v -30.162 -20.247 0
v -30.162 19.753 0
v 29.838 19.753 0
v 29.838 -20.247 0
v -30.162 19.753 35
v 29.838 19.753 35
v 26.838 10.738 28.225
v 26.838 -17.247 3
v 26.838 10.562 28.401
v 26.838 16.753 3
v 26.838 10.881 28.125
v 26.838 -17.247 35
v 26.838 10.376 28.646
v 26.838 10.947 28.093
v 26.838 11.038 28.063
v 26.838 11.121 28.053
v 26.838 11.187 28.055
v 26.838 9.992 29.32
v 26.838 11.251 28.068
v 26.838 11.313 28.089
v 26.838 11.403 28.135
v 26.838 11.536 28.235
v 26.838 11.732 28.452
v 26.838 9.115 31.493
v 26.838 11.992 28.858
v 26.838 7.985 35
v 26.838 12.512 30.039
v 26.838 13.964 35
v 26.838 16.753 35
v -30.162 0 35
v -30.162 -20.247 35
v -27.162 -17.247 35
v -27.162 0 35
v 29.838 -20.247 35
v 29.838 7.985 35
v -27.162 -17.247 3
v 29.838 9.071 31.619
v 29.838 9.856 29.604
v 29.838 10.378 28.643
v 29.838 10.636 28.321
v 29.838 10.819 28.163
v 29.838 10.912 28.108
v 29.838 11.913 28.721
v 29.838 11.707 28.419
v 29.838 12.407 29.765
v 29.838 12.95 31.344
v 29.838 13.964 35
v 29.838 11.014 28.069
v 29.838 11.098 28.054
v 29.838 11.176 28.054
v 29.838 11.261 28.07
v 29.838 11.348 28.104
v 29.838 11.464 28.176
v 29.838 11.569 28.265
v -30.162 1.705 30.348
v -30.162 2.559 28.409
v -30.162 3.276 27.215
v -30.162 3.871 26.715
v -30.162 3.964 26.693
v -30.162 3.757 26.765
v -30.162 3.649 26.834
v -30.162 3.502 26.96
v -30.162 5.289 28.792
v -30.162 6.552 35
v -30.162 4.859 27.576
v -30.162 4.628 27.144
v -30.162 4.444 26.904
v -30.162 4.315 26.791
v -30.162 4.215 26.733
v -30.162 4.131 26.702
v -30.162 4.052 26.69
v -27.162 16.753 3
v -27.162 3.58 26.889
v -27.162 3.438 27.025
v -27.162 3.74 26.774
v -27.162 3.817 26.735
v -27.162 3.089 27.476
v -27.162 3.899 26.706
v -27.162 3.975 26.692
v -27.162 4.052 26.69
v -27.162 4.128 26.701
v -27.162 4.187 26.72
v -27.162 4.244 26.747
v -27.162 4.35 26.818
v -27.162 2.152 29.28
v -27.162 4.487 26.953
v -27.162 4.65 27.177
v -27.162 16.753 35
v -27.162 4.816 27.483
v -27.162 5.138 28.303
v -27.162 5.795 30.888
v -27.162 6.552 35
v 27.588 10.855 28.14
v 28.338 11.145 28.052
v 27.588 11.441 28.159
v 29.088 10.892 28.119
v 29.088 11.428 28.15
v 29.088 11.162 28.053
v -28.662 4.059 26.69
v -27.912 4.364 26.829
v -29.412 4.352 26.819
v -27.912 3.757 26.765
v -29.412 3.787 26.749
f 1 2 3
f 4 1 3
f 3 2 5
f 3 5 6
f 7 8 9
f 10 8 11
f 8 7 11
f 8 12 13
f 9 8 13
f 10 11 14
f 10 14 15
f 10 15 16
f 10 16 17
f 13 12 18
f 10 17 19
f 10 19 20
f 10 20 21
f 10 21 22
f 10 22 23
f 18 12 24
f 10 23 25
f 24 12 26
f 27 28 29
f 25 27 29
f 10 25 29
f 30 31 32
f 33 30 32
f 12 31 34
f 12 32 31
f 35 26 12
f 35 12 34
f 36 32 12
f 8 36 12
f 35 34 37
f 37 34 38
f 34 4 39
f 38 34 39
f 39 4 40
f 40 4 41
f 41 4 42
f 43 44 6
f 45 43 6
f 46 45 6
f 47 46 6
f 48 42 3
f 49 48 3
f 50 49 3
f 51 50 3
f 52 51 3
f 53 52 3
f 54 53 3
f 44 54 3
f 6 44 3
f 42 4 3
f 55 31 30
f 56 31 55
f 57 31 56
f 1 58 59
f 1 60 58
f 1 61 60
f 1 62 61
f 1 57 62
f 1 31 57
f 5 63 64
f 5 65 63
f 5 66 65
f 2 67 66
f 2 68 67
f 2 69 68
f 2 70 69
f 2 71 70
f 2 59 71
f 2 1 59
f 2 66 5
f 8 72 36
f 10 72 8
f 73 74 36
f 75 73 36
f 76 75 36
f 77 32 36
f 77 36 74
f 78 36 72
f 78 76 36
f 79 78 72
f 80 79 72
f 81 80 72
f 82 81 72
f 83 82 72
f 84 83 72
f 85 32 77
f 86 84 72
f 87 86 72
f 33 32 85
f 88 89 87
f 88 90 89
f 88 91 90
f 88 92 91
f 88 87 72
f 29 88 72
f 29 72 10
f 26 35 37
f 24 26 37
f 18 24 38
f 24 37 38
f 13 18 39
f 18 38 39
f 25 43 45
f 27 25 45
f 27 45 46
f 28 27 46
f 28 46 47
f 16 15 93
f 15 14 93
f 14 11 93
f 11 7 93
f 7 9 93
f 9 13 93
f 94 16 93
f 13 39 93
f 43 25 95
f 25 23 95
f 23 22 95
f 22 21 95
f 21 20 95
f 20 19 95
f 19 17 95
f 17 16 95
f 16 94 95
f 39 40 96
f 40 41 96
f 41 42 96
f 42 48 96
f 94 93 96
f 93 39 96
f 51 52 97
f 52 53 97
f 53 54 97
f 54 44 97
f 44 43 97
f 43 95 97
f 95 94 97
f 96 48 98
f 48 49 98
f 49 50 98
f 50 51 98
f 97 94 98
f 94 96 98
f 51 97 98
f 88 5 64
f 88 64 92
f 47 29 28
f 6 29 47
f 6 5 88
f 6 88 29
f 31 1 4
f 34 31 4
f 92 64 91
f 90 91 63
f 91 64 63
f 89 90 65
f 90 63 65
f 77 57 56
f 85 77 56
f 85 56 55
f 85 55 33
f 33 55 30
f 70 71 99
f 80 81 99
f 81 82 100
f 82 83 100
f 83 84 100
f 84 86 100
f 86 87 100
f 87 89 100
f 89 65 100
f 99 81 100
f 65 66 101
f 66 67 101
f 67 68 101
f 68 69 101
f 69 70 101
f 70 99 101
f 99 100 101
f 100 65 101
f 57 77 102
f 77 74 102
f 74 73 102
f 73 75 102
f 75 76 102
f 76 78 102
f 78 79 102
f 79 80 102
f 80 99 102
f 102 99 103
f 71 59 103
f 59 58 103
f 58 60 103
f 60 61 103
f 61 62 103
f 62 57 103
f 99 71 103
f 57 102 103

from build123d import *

# Parameters (mm, degrees)
F0_W     = 60
F0_H     = 40
F1_DEPTH = 35
F2_W     = 54
F2_H     = 34
F3_DEPTH = 32
F5_DEPTH = 5
F7_DEPTH = 5


with BuildPart() as f1:
    # F0 (on Top) → F1 (new body)
    with BuildSketch(Plane.XY):
        with Locations((-0.1621283591, -0.2469897495)):
            Rectangle(F0_W, F0_H)
    extrude(amount=F1_DEPTH)

    # F2 (on face) → F3 (cut)
    with BuildSketch(Plane.XY.offset(35)):
        with Locations((-0.1621283591, -0.2469897495)):
            Rectangle(F2_W, F2_H)
    extrude(amount=-F3_DEPTH, mode=Mode.SUBTRACT)

    # F4 (on face) → F5 (cut)
    with BuildSketch(Plane(origin=(-30.1621283591, 0, 0), x_dir=(0, -1, 0), z_dir=(-1, 0, 0))):
        with BuildLine():
            Line((0, 35), (-6.551516708, 35))
            add(Edge.make_bspline(
                [(-6.551516708, 35), (-5.8386453378, 30.8886812927), (-4.389754715, 22.5325438864), (-1.4787538932, 30.8001527505), (0, 35)],
                knots=[0, 0, 0, 0, 0.49201186, 1, 1, 1, 1], degree=3))
        make_face()
    extrude(amount=-F5_DEPTH, mode=Mode.SUBTRACT)

    # F6 (on face) → F7 (cut)
    with BuildSketch(Plane.YZ.offset(29.8378716409)):
        with BuildLine():
            Line((13.9640960842, 35), (7.9849697649, 35))
            add(Edge.make_bspline(
                [(7.9849697649, 35), (9.0646587158, 31.5158458238), (11.2144741419, 24.578395562), (13.0502773485, 31.5364484313), (13.9640960842, 35)],
                knots=[0, 0, 0, 0, 0.5022240225, 1, 1, 1, 1], degree=3))
        make_face()
    extrude(amount=-F7_DEPTH, mode=Mode.SUBTRACT)


solid = f1.part
